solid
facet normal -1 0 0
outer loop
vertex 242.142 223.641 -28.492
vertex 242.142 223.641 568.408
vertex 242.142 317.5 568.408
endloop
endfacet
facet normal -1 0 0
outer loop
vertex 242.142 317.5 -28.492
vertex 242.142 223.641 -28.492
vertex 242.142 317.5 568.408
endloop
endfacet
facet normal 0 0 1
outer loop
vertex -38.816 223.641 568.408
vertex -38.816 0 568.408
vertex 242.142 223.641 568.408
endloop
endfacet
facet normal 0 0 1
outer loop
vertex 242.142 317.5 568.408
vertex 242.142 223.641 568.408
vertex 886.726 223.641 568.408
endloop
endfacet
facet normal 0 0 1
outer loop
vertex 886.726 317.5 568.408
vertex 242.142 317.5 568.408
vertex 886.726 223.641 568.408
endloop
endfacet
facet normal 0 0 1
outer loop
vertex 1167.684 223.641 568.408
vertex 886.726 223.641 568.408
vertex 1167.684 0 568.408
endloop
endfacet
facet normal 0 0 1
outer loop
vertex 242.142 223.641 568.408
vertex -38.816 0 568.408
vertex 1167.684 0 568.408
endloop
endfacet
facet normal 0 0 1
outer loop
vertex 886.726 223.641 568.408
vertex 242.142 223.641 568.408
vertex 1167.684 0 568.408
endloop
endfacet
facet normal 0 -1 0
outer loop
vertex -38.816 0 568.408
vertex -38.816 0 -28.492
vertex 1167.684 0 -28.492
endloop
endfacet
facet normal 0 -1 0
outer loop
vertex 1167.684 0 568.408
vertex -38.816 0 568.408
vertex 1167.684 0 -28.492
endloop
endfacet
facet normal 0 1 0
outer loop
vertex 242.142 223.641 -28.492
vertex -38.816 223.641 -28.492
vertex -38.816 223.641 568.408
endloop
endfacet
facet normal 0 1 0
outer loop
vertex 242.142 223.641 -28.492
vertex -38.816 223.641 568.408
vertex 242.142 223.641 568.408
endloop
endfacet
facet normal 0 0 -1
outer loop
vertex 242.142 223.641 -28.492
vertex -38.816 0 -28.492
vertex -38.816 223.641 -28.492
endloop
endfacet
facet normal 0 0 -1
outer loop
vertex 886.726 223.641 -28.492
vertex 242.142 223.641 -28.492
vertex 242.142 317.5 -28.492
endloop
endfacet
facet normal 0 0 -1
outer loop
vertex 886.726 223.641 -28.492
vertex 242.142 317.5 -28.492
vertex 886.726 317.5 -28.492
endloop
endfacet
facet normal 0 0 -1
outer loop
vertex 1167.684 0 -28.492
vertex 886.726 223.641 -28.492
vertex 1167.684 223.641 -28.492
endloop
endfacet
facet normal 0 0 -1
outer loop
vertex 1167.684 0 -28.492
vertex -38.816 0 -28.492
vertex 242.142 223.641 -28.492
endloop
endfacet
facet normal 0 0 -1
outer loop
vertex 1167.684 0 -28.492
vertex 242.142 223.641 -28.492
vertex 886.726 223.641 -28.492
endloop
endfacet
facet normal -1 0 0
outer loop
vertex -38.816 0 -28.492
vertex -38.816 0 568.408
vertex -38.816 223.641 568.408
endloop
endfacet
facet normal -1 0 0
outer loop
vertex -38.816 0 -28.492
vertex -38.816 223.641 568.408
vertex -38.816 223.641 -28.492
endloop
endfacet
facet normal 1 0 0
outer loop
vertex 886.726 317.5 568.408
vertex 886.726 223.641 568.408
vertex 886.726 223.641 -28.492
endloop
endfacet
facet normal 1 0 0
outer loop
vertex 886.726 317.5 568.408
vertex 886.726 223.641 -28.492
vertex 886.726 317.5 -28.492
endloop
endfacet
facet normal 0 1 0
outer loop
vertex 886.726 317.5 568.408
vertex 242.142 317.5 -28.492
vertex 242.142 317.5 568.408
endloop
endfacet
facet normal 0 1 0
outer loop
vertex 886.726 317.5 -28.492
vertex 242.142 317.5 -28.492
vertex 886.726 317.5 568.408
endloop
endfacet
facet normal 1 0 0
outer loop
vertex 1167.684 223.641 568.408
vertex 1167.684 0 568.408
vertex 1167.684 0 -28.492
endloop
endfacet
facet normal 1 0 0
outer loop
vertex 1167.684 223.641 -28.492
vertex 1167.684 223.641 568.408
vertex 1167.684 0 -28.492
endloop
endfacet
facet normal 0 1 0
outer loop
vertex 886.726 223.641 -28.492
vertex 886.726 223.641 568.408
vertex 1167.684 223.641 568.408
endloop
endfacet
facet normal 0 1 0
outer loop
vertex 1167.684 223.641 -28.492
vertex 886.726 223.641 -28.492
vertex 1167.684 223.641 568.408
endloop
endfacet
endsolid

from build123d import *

# Parameters (mm, degrees)
SKETCH1_W      = 1206.5
SKETCH1_H      = 596.9
EXTRUDE1_DEPTH = 317.5
SKETCH2_W      = 280.957876244
SKETCH2_H      = 93.858968371
EXTRUDE2_DEPTH = 1350.289506876


with BuildPart() as part:
    # Sketch1 → Extrude1 (new body)
    with BuildSketch(Plane(origin=(0, 0, 0), x_dir=(1, 0, 0), z_dir=(0, 1, 0))):
        with Locations((564.434166787, -269.957526684)):
            Rectangle(SKETCH1_W, SKETCH1_H)
    extrude(amount=EXTRUDE1_DEPTH)

    # Sketch2 → Extrude2 (cut, through all)
    with BuildSketch(Plane.XY.offset(568.407526684)):
        with Locations((1027.205228665, 270.570515815)):
            Rectangle(SKETCH2_W, SKETCH2_H)
        with Locations((101.663104909, 270.570515815)):
            Rectangle(SKETCH2_W, SKETCH2_H)
    extrude(amount=-EXTRUDE2_DEPTH, mode=Mode.SUBTRACT)


solid = part.part
